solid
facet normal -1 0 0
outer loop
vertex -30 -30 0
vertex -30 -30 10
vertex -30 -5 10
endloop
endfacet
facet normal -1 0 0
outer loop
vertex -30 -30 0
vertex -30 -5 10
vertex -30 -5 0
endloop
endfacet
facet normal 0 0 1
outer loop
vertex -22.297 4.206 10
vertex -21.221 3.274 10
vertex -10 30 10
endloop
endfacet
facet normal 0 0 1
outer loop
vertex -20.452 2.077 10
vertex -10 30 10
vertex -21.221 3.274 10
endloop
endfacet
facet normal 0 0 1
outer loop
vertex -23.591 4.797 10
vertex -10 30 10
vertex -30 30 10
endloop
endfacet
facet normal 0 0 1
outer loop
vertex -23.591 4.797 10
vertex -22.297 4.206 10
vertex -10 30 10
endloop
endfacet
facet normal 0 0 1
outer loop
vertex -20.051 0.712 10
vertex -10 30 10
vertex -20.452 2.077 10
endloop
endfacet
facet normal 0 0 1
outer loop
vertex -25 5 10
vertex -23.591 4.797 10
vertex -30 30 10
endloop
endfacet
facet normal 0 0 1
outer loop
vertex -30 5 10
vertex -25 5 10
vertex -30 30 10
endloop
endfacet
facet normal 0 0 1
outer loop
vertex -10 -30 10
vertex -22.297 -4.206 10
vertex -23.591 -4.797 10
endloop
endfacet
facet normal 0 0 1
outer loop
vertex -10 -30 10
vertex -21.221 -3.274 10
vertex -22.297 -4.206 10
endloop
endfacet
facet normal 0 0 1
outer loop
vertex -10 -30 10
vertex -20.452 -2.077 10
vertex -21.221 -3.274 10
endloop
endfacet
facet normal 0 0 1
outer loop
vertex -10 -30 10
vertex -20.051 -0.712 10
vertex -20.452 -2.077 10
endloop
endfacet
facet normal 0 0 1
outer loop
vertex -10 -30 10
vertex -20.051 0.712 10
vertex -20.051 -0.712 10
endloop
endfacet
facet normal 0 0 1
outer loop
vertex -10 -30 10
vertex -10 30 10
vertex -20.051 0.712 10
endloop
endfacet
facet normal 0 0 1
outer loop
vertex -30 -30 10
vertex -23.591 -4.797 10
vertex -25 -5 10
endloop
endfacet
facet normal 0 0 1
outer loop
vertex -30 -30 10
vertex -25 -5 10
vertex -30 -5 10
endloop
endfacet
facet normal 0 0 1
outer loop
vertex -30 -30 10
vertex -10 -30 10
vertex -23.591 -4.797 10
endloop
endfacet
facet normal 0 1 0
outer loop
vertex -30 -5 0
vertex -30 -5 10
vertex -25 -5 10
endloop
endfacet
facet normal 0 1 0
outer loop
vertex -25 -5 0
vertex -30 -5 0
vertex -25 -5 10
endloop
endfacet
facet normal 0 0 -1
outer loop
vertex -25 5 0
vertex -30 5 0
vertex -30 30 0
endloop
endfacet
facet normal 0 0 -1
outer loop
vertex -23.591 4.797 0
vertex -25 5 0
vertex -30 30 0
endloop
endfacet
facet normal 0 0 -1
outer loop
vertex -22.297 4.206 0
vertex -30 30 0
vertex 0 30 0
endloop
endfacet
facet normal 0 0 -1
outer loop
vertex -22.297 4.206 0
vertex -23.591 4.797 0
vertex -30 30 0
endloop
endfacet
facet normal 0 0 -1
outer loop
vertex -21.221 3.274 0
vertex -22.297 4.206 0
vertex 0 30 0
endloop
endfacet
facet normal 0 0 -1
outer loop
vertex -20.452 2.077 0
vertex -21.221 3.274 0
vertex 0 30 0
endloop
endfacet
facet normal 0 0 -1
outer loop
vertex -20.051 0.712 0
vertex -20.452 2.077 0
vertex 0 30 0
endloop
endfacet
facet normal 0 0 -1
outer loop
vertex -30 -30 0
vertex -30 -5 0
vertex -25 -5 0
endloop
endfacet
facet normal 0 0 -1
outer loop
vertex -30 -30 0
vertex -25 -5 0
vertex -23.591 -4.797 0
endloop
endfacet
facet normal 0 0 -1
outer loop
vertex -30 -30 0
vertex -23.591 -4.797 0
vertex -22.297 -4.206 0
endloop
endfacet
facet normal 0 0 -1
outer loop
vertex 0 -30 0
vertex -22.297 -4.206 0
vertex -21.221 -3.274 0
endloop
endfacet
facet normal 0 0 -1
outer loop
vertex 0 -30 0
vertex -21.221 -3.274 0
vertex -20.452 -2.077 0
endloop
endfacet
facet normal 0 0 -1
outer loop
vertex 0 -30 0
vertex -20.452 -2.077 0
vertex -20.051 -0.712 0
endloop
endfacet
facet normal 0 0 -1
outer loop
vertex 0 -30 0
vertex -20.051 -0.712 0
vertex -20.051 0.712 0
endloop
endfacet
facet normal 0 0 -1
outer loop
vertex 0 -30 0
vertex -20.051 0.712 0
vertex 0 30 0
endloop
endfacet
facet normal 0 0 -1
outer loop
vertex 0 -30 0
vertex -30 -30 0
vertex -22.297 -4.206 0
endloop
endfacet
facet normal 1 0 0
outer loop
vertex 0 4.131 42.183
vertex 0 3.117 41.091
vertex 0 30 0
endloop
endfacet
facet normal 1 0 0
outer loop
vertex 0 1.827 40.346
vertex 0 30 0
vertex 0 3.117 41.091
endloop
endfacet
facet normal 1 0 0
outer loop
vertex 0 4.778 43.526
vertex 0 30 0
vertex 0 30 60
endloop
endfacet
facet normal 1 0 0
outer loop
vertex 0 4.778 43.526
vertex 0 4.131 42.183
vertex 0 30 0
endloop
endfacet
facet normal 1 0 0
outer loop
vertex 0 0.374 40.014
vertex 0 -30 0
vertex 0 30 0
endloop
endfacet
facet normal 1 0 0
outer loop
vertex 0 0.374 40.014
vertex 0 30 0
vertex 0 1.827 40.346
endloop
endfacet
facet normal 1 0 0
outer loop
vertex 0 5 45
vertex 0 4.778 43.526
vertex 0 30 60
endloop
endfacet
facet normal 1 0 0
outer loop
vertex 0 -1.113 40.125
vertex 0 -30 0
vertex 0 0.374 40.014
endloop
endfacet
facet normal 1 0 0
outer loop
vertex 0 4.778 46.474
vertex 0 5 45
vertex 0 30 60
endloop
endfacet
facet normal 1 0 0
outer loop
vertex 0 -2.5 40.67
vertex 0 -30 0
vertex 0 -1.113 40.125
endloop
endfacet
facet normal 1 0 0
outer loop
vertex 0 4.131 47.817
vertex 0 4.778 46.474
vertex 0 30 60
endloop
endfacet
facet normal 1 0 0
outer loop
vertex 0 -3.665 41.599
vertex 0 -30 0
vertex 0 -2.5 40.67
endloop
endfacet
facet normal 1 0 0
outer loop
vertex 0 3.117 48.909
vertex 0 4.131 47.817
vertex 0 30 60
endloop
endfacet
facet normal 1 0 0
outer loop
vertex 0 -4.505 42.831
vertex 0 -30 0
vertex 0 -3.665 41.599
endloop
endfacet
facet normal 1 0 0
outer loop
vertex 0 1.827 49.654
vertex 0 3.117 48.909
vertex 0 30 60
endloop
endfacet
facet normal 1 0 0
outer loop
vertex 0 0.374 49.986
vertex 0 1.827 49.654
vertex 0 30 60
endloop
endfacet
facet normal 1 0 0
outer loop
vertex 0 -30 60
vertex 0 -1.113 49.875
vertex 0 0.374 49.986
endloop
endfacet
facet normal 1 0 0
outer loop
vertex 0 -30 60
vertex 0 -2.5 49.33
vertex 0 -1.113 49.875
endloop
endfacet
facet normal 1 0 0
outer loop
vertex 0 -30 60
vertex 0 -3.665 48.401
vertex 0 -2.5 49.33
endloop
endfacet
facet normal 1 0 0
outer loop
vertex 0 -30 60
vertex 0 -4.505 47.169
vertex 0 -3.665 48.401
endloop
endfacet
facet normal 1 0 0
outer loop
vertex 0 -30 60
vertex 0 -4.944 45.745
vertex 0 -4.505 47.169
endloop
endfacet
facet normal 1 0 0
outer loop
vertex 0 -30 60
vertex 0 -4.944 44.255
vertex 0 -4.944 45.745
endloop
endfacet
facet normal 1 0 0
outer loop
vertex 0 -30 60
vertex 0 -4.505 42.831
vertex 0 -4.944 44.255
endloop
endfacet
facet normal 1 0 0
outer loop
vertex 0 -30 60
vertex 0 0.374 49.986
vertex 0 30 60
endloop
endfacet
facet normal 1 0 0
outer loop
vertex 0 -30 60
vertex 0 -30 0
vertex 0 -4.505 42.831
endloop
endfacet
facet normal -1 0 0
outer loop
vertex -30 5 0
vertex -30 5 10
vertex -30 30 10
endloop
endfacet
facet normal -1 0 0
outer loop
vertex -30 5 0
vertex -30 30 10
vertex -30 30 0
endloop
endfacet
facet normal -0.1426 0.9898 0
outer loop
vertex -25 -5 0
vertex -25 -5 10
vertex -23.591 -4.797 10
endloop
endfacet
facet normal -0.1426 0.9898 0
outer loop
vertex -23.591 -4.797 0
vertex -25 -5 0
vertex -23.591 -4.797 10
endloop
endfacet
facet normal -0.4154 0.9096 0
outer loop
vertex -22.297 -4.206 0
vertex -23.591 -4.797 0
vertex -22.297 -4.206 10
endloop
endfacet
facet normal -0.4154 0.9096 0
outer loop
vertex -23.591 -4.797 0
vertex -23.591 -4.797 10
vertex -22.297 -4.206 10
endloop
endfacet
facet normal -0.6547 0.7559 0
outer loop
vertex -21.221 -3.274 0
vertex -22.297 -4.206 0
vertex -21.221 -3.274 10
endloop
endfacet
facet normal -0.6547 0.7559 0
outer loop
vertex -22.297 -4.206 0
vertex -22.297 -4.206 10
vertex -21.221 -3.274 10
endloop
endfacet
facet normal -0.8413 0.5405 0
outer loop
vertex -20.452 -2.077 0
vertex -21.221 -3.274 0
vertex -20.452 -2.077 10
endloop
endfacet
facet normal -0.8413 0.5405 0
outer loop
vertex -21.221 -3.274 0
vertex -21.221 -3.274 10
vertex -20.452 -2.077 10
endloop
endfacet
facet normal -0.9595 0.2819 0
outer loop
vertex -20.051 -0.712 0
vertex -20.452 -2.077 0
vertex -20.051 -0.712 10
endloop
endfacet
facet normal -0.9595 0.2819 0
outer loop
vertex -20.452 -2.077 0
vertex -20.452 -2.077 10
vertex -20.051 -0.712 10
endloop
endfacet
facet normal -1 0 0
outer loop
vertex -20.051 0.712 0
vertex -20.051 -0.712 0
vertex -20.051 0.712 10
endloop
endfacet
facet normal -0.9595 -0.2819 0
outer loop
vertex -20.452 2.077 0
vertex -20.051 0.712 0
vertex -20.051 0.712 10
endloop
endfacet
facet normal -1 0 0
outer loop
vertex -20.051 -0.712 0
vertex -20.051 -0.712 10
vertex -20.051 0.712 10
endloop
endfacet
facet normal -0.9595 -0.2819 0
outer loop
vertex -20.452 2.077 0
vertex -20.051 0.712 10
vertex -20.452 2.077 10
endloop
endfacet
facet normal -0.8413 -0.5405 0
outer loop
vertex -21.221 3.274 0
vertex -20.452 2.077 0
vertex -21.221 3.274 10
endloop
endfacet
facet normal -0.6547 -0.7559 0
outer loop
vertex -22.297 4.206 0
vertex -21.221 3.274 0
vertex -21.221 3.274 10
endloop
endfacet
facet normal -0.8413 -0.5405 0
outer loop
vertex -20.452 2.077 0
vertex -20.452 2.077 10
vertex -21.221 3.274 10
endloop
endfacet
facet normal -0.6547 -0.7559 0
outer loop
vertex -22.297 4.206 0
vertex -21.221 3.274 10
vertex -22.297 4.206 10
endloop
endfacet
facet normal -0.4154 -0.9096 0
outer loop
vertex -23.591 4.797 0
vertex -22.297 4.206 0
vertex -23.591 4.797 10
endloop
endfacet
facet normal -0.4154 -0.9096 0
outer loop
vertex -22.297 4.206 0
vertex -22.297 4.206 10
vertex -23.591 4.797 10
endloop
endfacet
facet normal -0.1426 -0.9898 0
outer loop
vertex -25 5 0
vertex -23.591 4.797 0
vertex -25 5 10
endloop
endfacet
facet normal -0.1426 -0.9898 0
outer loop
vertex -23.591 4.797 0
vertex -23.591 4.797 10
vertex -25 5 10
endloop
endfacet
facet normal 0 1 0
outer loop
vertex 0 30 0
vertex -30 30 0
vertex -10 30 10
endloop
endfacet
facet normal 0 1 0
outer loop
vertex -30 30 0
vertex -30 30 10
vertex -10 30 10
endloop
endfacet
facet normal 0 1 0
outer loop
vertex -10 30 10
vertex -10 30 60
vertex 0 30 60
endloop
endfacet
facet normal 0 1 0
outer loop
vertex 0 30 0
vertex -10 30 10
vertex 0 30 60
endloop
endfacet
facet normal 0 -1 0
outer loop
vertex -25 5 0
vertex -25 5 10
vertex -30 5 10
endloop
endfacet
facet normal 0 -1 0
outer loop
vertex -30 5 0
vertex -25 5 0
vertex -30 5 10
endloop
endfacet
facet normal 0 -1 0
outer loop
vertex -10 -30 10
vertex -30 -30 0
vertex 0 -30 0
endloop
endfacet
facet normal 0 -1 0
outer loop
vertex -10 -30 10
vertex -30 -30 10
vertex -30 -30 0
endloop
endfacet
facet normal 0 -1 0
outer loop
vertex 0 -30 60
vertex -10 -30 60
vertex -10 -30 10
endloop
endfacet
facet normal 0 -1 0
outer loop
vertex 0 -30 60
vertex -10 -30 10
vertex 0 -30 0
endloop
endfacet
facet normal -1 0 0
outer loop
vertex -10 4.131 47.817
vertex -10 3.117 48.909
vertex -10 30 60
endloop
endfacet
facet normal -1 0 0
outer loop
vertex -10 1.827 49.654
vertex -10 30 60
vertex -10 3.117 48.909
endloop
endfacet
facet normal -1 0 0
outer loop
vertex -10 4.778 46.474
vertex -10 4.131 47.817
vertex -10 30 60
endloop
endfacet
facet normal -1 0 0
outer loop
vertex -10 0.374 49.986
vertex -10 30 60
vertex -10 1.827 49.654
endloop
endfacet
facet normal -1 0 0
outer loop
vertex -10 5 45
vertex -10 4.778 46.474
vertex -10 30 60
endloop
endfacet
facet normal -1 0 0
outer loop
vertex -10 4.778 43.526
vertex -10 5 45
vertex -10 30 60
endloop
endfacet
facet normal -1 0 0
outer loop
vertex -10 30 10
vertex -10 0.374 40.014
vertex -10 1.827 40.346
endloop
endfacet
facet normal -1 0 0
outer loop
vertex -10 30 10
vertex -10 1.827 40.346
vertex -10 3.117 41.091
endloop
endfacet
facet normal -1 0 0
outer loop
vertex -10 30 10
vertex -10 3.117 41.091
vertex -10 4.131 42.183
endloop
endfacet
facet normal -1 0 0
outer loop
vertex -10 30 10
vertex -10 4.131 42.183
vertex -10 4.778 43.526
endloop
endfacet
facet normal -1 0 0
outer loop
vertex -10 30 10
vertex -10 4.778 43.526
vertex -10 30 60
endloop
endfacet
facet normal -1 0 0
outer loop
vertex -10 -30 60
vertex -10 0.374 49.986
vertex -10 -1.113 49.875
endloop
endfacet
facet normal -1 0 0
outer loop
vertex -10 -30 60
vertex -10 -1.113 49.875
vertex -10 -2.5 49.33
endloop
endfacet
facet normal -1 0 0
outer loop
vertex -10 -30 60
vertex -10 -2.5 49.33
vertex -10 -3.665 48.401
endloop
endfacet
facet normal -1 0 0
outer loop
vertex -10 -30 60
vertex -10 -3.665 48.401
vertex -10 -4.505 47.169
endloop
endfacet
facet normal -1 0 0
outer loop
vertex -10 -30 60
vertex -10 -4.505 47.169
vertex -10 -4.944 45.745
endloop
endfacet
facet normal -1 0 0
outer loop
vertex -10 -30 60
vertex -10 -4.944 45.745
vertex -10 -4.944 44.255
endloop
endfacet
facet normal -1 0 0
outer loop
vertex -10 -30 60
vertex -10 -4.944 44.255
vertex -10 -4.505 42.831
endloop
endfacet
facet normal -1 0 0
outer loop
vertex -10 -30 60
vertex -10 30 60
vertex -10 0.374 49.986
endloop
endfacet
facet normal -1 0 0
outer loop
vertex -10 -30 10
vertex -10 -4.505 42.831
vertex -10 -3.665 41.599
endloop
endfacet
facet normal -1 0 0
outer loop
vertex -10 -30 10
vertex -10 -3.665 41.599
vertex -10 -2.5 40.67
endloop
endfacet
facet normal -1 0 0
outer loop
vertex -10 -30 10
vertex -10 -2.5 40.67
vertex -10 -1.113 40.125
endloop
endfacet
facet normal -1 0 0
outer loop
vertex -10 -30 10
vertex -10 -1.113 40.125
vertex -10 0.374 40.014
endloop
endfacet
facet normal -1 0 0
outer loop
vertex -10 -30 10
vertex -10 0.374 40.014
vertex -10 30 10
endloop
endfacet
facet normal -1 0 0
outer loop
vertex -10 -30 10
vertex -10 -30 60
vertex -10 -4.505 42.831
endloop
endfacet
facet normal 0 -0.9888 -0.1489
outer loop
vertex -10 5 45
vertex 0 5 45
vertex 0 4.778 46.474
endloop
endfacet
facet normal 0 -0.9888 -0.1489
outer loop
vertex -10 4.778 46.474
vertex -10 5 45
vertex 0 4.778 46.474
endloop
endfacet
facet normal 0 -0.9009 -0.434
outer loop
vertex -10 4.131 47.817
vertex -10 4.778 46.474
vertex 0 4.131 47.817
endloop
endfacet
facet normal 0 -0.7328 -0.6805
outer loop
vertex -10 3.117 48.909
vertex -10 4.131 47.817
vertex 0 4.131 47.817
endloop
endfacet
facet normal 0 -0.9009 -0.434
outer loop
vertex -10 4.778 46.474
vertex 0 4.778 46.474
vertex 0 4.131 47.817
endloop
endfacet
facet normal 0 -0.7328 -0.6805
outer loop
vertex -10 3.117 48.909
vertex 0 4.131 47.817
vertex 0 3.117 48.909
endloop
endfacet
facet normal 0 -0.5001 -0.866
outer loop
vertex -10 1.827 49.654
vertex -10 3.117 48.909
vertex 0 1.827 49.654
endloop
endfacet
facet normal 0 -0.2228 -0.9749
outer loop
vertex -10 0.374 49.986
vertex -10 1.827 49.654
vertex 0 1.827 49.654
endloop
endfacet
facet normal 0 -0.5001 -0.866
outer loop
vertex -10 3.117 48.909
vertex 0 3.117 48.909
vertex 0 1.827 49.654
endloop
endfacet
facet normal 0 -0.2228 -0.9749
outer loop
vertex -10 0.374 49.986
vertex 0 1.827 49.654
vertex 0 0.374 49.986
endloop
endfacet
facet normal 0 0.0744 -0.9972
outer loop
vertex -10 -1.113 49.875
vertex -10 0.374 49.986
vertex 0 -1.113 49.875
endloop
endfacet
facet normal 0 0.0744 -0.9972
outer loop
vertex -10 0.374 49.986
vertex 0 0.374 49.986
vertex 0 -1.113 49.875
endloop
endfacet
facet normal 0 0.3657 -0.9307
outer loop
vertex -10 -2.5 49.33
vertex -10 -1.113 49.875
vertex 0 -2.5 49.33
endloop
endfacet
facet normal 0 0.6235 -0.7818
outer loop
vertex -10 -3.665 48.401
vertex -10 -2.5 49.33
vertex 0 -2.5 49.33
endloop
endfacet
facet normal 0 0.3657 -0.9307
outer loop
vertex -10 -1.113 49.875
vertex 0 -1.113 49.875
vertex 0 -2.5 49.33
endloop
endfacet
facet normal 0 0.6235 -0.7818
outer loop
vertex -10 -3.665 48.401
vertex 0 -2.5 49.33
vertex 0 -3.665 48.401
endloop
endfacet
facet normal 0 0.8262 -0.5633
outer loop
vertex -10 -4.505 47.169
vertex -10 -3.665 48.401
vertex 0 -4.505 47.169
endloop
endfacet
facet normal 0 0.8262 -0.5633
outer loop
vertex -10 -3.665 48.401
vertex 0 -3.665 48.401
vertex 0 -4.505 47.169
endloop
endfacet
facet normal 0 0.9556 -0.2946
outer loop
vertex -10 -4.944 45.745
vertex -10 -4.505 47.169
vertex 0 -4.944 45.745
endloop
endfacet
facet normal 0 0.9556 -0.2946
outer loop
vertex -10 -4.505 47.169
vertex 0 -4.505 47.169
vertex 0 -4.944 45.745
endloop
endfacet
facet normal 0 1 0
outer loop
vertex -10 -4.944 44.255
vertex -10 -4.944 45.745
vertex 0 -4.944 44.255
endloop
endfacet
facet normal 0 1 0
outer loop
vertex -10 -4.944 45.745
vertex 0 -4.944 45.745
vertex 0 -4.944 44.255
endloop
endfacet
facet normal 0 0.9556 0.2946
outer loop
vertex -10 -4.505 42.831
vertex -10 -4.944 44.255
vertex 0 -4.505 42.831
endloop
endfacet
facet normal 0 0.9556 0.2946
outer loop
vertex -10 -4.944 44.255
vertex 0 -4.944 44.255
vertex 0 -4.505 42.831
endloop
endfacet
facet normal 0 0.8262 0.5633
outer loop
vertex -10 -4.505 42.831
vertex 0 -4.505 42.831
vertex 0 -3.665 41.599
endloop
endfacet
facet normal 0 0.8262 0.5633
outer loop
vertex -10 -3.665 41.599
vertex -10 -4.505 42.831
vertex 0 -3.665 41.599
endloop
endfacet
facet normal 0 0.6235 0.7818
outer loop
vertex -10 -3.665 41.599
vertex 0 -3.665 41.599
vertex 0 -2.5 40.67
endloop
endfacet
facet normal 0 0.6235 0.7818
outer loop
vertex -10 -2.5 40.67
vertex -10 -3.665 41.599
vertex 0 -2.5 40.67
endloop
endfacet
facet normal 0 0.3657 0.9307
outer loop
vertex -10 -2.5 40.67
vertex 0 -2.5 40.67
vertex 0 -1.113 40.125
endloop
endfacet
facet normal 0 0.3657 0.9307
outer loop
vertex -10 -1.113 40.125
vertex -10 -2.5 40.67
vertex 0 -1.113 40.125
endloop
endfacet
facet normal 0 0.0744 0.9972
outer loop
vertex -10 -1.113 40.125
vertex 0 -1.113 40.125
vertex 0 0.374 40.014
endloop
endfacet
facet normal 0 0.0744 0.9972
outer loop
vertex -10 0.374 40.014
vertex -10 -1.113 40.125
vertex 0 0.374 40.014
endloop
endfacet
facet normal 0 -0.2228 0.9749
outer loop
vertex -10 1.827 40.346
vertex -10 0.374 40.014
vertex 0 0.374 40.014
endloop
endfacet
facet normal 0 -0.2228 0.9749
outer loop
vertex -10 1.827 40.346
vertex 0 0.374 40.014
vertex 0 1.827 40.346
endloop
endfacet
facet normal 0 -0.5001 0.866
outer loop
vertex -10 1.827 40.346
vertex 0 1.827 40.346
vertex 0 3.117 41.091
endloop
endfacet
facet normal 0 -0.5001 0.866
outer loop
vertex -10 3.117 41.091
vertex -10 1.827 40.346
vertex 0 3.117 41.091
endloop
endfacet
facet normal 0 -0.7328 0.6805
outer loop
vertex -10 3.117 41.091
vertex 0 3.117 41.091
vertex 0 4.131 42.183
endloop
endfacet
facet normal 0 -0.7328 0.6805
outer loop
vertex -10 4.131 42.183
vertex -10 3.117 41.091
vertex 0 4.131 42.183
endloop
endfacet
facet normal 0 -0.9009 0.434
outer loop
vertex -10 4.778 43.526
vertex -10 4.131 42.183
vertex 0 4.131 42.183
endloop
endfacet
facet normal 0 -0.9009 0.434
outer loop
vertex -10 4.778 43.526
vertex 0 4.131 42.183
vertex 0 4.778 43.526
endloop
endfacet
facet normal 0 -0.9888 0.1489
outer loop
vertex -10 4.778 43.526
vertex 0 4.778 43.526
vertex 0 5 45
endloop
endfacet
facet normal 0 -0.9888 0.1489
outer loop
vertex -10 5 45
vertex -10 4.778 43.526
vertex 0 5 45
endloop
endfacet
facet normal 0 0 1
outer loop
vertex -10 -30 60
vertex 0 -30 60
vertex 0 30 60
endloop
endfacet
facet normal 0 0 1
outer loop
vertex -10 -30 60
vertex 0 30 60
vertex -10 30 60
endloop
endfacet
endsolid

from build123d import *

# Parameters (mm, degrees)
F1_DEPTH = 30
F2_R     = 5
F3_DEPTH = 28.448
F5_DEPTH = 25.4


with BuildPart() as f1:
    # F0 (on Front) → F1 (new body, symmetric)
    with BuildSketch(Plane.XZ):
        Polygon((-30, 0), (0, 0), (0, 60), (-10, 60), (-10, 10), (-30, 10), align=None)
    extrude(amount=F1_DEPTH, both=True)

    # F2 (on face) → F3 (cut)
    with BuildSketch(Plane.YZ):
        with Locations((0, 45)):
            Circle(F2_R)
    extrude(amount=-F3_DEPTH, mode=Mode.SUBTRACT)

    # F4 (on face) → F5 (cut)
    with BuildSketch(Plane.XY.offset(10)):
        with BuildLine():
            Line((-25, 5), (-30, 5))
            Line((-30, 5), (-30, -5))
            Line((-30, -5), (-25, -5))
            ThreePointArc((-25, -5), (-20, 0), (-25, 5))
        make_face()
    extrude(amount=-F5_DEPTH, mode=Mode.SUBTRACT)


solid = f1.part
